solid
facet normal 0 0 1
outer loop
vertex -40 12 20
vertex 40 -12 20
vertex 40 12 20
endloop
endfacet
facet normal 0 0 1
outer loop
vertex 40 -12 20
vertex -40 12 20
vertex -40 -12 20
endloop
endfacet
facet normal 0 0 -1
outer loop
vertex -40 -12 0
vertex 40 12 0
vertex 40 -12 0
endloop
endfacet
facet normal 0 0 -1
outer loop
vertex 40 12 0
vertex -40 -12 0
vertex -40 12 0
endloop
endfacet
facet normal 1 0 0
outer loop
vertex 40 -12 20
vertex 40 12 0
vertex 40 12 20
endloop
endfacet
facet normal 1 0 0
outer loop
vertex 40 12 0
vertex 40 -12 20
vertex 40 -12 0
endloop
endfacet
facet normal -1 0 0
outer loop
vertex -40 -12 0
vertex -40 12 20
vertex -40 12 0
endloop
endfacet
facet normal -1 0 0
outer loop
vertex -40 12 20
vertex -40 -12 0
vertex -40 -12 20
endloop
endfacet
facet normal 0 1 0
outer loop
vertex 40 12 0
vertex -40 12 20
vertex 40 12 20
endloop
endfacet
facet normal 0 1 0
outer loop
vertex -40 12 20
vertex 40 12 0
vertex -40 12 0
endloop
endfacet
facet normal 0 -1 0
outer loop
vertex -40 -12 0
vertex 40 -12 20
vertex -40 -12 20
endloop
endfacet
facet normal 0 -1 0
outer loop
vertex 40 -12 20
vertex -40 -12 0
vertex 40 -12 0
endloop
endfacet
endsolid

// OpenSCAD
// Magnetic bead rack for one 8-tube strip of 0.2 mL PCR tubes
// Dimensions measured with calipers

// Block dimensions
block_length = 80;  // mm (X)
block_width = 24;   // mm (Y)
block_height = 20;  // mm (Z)

// Tube seat parameters
tube_hole_diameter = 6.4;  // mm
tube_hole_depth = 12;      // mm (from top face z=20 down to z=8)
tube_cone_bottom_diameter = 3;  // mm
tube_cone_bottom_z = 2;        // mm (floor thickness 2 mm)
tube_spacing = 9;              // mm centre-to-centre
num_tubes = 8;

// Magnet pocket parameters
magnet_length = 60.4;   // mm (X)
magnet_width = 3.3;     // mm (Y)
magnet_height = 10.2;   // mm (Z)
magnet_y_offset = 6;    // mm (centred at y = -6 and y = 6)

// Rendering quality
$fn = 64;

// Main block
union() {
    // Solid block
    translate([-block_length/2, -block_width/2, 0])
        cube([block_length, block_width, block_height]);

    // Tube seats (8 holes)
    for (i = [0 : num_tubes - 1]) {
        // Calculate X position: centred on block
        // Total span of 8 tubes with 9mm spacing: 7 * 9 = 63 mm
        // First tube at -63/2 = -31.5, last at +31.5
        x_pos = (i - (num_tubes - 1) / 2) * tube_spacing;
        
        translate([x_pos, 0, 0]) {
            // Cylindrical part: from z=20 down to z=8 (depth 12)
            // We subtract from the block, so we place the cylinder at the correct position
            // The cylinder goes from z=8 to z=20
            translate([0, 0, 8])
                cylinder(h = tube_hole_depth, r = tube_hole_diameter / 2, center = false);
            
            // Conical part: from z=8 down to z=2
            // Top diameter 6.4, bottom diameter 3
            // Height of cone = 8 - 2 = 6 mm
            translate([0, 0, 2])
                cylinder(h = 6, r1 = tube_cone_bottom_diameter / 2, r2 = tube_hole_diameter / 2, center = false);
        }
    }

    // Magnet pockets (2 pockets at y = -6 and y = 6)
    for (y_pos = [-magnet_y_offset, magnet_y_offset]) {
        translate([0, y_pos, 0]) {
            // Pocket is open at bottom (z=0), extends up to z=10.2
            // Centred in X: from -magnet_length/2 to +magnet_length/2
            // Width in Y: magnet_width, centred at y_pos
            translate([-magnet_length/2, -magnet_width/2, 0])
                cube([magnet_length, magnet_width, magnet_height]);
        }
    }
}

// Difference to create holes and pockets
difference() {
    // Solid block
    translate([-block_length/2, -block_width/2, 0])
        cube([block_length, block_width, block_height]);

    // Tube seats (8 holes)
    for (i = [0 : num_tubes - 1]) {
        x_pos = (i - (num_tubes - 1) / 2) * tube_spacing;
        
        translate([x_pos, 0, 0]) {
            // Cylindrical part: from z=8 to z=20
            // Extend slightly past to ensure clean cut
            translate([0, 0, 7.99])
                cylinder(h = tube_hole_depth + 0.02, r = tube_hole_diameter / 2, center = false);
            
            // Conical part: from z=2 to z=8
            // Extend slightly past bottom
            translate([0, 0, 1.99])
                cylinder(h = 6.02, r1 = tube_cone_bottom_diameter / 2, r2 = tube_hole_diameter / 2, center = false);
        }
    }

    // Magnet pockets (2 pockets at y = -6 and y = 6)
    for (y_pos = [-magnet_y_offset, magnet_y_offset]) {
        translate([0, y_pos, 0]) {
            // Pocket is open at bottom (z=0), extends up to z=10.2
            // Extend slightly past to ensure clean cut
            translate([-magnet_length/2, -magnet_width/2, -0.01])
                cube([magnet_length, magnet_width, magnet_height + 0.02]);
        }
    }
}
